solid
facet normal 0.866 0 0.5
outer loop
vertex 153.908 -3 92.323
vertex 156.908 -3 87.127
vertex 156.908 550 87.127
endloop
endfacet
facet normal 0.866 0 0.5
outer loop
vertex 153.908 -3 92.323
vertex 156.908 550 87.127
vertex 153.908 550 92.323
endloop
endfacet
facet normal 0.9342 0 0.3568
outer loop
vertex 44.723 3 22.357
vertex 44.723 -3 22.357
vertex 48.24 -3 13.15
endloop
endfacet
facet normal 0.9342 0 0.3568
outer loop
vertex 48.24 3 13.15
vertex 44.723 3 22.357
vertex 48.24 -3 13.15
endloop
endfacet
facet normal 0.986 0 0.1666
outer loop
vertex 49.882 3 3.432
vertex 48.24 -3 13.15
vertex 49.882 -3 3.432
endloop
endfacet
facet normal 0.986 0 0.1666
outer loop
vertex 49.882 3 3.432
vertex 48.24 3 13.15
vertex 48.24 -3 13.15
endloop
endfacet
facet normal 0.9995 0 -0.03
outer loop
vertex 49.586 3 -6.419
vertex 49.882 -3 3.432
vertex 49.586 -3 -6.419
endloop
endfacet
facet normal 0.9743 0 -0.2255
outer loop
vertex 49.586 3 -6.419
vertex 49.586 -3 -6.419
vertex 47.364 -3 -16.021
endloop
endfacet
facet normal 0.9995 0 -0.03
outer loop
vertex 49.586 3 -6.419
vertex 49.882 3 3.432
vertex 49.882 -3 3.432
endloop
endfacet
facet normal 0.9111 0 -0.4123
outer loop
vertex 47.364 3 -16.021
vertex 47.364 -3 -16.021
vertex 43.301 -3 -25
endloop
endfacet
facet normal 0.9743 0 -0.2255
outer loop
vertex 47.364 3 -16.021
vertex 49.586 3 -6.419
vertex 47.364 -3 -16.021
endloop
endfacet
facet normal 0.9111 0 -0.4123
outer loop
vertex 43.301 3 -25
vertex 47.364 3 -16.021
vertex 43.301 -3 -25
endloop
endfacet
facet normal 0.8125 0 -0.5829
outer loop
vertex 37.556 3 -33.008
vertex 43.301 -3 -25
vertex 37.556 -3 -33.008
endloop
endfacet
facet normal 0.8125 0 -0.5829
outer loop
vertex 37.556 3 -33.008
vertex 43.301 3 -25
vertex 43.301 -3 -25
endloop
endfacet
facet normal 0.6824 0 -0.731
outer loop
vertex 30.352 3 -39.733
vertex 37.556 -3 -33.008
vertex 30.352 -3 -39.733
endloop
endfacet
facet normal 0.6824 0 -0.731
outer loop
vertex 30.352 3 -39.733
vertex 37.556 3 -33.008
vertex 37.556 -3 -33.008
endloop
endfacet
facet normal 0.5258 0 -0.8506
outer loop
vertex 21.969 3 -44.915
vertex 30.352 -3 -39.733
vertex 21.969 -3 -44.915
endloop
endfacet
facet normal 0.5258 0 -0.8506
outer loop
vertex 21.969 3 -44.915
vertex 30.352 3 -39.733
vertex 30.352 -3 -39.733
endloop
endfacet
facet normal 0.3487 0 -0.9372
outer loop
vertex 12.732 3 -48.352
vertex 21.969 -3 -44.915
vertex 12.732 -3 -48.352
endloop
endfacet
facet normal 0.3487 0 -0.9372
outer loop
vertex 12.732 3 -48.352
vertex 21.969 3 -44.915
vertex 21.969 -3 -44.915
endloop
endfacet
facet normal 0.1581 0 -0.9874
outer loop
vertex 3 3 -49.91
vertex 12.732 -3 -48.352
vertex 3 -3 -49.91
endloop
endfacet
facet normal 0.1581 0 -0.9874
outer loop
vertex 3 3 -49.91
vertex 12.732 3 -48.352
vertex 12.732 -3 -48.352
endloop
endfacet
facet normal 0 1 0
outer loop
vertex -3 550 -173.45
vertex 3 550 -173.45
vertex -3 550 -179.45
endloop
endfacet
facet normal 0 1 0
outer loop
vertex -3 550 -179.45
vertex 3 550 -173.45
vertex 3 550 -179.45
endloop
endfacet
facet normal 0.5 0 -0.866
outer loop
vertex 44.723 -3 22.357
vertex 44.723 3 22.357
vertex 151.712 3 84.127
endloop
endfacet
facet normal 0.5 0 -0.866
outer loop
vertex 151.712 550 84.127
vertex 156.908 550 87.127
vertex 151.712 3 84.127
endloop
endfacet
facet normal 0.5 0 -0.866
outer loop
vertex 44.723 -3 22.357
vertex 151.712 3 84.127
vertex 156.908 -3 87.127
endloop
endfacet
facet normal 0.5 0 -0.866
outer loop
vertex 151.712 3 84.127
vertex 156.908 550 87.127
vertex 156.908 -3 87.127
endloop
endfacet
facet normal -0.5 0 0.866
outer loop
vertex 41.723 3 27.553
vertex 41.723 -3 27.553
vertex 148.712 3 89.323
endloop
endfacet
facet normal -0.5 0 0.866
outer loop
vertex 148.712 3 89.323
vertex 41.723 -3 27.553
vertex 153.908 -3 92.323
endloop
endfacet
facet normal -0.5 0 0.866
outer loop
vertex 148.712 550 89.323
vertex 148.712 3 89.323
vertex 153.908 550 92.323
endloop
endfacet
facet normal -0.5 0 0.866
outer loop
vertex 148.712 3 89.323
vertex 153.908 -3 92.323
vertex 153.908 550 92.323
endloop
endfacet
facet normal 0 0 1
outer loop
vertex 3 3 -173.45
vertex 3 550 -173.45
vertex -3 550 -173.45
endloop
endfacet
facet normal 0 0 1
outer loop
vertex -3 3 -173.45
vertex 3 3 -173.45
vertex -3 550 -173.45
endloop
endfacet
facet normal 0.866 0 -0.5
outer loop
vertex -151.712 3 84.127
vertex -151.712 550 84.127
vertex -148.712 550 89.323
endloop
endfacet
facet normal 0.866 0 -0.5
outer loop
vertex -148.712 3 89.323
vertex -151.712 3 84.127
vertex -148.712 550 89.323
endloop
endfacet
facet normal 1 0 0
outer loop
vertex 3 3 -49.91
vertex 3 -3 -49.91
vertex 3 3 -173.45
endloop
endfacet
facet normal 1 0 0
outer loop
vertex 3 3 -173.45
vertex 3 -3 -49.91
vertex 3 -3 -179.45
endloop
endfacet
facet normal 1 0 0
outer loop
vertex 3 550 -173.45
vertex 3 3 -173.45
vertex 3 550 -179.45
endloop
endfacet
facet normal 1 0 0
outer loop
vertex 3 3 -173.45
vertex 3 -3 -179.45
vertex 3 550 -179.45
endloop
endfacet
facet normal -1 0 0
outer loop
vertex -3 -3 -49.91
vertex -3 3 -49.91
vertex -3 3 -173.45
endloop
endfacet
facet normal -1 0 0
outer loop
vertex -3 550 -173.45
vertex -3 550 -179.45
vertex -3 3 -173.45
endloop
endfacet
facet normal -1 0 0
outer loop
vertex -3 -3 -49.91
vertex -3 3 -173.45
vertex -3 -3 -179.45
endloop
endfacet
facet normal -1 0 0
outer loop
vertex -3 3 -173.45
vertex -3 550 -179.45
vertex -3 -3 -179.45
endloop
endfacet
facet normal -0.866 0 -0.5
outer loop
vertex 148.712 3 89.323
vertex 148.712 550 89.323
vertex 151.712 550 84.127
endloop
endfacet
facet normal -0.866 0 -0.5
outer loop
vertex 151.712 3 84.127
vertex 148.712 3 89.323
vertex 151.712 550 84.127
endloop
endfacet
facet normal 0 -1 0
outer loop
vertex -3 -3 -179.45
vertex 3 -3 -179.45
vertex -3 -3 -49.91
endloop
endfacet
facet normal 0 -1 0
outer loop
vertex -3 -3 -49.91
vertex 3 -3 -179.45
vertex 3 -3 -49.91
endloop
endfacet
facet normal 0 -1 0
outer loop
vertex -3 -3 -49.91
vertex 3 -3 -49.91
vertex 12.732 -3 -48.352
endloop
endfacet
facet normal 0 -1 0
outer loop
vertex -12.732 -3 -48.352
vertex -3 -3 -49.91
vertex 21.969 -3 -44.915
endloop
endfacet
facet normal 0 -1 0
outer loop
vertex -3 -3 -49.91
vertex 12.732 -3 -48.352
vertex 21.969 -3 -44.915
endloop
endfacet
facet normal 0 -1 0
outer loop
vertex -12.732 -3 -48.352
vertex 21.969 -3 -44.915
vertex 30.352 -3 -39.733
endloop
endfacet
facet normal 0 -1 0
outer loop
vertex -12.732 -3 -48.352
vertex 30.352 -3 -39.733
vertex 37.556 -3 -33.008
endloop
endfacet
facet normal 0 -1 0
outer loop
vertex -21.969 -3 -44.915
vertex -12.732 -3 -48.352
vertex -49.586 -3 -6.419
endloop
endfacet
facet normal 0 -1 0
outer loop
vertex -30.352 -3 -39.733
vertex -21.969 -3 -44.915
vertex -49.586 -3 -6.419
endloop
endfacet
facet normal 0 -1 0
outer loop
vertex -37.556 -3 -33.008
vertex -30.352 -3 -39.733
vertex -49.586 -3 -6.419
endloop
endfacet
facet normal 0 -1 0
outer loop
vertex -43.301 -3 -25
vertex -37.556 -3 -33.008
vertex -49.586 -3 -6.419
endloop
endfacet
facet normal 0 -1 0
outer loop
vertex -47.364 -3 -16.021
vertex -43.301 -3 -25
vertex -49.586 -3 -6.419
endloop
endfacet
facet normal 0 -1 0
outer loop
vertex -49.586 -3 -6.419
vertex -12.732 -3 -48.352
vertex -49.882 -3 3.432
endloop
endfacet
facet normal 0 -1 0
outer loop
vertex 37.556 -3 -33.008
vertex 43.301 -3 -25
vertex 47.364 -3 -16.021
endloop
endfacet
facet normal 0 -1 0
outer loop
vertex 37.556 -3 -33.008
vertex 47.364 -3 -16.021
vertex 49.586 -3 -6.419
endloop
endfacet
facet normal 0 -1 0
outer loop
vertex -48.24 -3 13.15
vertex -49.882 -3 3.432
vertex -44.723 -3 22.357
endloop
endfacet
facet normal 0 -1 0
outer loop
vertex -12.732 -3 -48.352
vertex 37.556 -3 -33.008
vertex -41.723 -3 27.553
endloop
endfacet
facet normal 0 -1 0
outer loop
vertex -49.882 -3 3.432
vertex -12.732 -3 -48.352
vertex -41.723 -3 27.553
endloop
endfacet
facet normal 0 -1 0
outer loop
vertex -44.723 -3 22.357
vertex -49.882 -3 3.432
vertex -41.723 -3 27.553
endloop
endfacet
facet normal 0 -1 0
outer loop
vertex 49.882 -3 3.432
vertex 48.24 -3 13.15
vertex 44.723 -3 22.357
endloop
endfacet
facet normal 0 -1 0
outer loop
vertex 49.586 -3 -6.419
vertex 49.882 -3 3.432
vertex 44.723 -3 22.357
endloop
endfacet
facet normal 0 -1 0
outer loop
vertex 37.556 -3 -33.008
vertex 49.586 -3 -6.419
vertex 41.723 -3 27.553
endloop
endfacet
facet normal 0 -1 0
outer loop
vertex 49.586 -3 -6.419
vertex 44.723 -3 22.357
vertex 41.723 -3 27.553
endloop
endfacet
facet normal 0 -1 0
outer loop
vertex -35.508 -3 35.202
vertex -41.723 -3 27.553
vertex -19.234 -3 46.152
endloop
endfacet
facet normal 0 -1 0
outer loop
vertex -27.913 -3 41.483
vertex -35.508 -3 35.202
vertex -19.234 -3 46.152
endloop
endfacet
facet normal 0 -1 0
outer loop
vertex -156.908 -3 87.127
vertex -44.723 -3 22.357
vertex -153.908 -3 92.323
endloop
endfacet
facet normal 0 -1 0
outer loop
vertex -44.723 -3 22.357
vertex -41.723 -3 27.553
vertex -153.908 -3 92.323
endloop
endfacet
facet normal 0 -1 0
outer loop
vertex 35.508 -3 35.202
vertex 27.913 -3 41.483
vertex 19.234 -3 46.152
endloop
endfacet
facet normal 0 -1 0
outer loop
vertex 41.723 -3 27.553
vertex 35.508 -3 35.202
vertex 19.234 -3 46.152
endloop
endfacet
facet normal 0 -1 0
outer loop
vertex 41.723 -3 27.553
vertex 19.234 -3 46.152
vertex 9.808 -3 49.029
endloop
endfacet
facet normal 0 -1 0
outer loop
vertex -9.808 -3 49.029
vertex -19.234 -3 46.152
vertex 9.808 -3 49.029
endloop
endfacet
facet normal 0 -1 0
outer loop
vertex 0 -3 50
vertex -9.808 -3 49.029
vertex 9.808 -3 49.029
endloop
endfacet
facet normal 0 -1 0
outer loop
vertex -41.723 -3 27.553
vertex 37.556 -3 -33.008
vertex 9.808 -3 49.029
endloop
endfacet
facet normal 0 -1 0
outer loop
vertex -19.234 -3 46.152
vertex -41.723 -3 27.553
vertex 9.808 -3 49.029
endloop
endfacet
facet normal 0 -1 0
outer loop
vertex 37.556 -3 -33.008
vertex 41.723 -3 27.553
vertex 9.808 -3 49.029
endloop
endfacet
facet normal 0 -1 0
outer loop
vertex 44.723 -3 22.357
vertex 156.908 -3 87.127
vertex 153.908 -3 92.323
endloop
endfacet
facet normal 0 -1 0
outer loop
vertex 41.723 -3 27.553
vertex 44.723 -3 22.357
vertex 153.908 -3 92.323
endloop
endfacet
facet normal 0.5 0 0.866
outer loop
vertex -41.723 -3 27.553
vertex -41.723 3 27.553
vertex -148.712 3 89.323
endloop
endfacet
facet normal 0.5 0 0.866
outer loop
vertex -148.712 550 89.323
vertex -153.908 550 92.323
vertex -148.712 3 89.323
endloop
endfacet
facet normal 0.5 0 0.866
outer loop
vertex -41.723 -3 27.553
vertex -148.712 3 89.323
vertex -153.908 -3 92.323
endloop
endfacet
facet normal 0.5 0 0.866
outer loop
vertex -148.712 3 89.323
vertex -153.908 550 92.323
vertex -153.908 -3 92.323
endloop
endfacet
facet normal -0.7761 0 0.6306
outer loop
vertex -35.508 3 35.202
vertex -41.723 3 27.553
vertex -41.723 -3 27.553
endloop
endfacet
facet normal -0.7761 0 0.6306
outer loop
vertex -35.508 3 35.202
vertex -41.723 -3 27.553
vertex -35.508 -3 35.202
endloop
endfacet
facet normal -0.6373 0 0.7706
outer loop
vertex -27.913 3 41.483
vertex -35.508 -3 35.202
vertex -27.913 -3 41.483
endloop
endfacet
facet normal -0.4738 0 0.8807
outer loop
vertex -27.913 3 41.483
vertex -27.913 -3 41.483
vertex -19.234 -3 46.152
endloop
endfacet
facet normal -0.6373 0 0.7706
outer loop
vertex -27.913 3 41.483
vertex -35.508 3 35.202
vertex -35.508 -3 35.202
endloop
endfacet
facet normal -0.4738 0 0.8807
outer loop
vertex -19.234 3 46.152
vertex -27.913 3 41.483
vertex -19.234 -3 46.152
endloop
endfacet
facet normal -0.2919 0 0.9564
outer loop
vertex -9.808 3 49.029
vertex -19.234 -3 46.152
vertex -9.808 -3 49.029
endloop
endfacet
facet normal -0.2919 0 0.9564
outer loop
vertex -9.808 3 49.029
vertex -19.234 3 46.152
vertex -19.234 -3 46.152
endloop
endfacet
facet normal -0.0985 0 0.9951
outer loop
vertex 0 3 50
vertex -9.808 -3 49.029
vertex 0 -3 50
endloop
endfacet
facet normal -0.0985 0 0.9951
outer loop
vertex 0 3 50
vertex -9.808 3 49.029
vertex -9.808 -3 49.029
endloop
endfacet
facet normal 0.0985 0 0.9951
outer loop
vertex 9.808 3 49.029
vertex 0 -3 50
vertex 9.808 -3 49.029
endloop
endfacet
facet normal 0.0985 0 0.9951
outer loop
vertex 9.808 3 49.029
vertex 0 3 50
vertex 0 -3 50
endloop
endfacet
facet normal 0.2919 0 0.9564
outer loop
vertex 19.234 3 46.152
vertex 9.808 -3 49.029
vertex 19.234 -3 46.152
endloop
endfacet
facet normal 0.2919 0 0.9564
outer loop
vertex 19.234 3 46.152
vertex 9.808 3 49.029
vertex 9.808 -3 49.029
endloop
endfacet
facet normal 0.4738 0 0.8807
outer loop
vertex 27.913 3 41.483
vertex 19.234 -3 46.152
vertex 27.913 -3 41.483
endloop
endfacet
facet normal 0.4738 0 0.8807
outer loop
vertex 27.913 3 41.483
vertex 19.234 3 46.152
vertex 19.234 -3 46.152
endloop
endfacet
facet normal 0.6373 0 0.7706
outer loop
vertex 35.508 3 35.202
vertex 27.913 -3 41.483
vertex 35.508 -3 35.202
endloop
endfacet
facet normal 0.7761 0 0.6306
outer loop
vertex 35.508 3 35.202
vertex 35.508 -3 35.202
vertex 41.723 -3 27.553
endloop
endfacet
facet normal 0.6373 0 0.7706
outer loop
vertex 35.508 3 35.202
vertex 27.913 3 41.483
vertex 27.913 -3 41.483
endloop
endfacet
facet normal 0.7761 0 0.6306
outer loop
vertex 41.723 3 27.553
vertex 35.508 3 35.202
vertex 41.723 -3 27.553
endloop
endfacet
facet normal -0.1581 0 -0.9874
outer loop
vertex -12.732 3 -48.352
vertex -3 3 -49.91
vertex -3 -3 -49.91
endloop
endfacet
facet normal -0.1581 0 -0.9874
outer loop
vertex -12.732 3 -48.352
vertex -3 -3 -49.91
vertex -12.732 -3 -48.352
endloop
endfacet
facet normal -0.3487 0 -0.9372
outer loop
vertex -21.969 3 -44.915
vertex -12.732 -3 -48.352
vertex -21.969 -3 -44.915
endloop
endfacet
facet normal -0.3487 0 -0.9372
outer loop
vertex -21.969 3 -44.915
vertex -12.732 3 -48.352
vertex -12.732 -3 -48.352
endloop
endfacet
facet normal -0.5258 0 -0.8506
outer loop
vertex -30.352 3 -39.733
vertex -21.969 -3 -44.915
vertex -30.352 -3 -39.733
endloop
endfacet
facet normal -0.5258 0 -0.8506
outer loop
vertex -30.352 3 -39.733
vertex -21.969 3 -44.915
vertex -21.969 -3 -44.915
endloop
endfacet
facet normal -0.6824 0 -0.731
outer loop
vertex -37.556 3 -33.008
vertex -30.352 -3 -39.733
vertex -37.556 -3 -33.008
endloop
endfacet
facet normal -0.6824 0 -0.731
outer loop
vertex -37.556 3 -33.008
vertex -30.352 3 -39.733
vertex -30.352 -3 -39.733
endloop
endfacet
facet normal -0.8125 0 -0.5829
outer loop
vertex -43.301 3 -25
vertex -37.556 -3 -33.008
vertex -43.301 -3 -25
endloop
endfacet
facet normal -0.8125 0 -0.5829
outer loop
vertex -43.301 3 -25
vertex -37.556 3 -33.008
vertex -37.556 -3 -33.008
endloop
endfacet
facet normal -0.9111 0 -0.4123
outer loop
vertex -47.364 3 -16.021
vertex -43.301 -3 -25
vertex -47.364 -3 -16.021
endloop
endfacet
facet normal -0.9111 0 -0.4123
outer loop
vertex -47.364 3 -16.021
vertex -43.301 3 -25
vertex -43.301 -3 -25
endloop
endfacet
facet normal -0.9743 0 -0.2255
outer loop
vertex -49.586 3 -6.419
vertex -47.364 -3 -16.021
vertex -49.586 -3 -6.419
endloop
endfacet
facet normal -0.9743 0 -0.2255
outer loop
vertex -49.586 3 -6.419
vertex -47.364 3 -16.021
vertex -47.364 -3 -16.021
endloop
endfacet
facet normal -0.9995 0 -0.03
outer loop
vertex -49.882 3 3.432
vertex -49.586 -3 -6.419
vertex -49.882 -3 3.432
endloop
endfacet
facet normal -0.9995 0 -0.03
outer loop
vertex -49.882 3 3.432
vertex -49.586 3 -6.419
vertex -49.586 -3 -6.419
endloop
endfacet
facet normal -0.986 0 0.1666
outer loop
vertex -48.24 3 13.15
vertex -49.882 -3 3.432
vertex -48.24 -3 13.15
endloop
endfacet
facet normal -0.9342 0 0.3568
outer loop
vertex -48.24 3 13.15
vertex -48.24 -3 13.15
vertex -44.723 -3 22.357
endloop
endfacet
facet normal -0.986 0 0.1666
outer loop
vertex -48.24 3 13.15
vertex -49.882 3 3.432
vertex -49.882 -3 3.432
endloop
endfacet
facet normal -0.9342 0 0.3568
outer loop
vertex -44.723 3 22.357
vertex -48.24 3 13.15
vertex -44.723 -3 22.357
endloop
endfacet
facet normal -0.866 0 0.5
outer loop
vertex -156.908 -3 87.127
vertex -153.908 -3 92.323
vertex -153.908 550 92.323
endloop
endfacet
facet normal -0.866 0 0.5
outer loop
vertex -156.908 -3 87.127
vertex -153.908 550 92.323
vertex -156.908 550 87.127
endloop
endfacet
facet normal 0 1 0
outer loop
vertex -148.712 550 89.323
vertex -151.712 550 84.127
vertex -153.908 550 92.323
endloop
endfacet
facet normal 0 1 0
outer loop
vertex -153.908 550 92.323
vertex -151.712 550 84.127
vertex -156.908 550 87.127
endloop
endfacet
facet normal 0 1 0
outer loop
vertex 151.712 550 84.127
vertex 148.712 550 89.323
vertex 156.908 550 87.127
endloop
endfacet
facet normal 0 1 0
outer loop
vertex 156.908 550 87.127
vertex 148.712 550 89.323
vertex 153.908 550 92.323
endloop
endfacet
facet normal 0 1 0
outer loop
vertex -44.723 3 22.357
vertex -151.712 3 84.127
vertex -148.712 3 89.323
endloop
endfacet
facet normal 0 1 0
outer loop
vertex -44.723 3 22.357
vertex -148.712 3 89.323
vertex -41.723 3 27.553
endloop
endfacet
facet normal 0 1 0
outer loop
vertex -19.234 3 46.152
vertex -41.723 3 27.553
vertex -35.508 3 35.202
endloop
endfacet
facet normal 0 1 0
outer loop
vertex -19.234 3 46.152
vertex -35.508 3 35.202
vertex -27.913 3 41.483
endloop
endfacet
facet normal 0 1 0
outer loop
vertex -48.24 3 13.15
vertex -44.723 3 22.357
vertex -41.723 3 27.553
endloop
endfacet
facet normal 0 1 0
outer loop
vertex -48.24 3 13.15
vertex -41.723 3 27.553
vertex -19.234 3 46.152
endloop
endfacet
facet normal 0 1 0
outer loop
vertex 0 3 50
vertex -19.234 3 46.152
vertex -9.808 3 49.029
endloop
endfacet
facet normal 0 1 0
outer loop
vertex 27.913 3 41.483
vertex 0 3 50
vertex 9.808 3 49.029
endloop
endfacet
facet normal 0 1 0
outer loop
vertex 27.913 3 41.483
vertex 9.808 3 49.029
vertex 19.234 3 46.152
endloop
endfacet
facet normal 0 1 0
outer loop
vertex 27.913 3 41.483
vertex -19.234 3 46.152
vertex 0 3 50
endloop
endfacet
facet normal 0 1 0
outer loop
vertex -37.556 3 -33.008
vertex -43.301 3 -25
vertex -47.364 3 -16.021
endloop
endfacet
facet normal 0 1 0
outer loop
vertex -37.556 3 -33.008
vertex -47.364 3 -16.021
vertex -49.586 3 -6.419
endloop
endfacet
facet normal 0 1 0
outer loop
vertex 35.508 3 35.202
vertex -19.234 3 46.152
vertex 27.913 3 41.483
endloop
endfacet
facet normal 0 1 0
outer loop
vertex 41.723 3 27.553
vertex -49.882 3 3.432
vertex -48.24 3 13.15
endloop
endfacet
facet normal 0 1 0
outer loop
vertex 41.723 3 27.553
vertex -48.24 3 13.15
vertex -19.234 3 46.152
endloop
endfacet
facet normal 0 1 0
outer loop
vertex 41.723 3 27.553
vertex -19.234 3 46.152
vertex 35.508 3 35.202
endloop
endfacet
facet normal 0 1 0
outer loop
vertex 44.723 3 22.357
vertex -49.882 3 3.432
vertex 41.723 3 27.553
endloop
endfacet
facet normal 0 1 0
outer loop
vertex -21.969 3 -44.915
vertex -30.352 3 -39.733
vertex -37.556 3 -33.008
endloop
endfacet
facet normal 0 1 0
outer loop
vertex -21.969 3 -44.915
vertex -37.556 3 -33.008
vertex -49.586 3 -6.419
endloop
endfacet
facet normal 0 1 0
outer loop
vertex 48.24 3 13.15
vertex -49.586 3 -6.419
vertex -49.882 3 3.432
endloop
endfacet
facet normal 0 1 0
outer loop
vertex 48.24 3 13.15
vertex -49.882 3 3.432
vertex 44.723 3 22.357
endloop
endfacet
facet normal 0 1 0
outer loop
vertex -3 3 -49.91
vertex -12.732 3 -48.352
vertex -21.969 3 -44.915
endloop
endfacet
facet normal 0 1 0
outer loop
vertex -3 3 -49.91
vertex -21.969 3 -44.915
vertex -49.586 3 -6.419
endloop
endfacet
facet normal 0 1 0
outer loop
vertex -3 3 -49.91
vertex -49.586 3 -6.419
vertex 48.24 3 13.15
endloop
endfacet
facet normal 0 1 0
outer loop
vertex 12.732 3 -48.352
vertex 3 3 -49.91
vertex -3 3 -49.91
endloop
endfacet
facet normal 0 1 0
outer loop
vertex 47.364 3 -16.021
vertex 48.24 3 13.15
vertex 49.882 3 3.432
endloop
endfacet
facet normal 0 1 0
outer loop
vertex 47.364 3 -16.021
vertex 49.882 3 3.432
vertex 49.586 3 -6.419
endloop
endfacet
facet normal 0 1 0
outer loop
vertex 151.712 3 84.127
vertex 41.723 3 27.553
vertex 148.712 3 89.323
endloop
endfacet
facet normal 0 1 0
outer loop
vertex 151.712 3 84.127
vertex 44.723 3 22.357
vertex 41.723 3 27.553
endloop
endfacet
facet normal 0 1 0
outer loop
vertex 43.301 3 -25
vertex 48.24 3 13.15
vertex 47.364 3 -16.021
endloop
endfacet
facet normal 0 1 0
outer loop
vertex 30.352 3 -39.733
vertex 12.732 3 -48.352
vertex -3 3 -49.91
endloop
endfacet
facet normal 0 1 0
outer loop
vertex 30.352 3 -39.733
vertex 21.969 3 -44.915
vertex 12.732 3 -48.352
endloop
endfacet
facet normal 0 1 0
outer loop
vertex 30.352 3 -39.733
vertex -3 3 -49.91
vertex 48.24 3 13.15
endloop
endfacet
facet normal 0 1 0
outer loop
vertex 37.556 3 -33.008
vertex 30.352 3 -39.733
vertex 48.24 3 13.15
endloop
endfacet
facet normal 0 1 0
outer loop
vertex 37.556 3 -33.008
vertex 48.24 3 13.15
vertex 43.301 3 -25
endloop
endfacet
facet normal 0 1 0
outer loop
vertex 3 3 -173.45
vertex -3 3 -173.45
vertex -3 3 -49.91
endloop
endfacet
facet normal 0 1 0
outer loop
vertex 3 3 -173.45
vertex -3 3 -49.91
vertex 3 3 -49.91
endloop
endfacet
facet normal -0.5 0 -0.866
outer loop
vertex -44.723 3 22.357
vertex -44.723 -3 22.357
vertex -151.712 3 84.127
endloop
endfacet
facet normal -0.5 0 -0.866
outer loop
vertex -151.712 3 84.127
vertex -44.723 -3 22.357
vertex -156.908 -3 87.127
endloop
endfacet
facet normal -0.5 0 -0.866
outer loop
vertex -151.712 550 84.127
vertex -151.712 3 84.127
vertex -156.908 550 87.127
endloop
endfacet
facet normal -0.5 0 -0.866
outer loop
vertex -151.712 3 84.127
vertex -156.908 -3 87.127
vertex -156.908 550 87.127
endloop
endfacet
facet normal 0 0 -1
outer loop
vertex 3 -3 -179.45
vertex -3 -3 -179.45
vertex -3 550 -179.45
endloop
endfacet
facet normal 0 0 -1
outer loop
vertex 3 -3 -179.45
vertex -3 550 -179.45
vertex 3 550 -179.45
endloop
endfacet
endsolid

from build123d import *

# Parameters (mm, degrees)
ESQUISSE2_W                  = 6
ESQUISSE2_H                  = 6
ESQUISSE3_R                  = 50
BOSS_EXTRU_1_DEPTH           = 3
R_P_TITION_CIRCULAIRE1_COUNT = 3


with BuildPart() as part:
    # Balayage2: sweep along a curve in space
    with BuildLine() as balayage2_path:
        Line((0, 0, 0), (0, 0, -176.45))
        Line((0, 0, -176.45), (0, 550, -176.45))
    # Esquisse2 → Balayage2 (sweep)
    with BuildSketch(Plane.XY):
        Rectangle(ESQUISSE2_W, ESQUISSE2_H)
    balayage2 = sweep(path=balayage2_path.line, transition=Transition.RIGHT)

    # Esquisse3 → Boss.-Extru.1 (add, symmetric)
    with BuildSketch(Plane(origin=(0, 0, 0), x_dir=(1, 0, 0), z_dir=(0, 1, 0))):
        Circle(ESQUISSE3_R)
    extrude(amount=BOSS_EXTRU_1_DEPTH, both=True)

    # Répétition circulaire1: Balayage2 ×3 about axis
    r_p_tition_circulaire1_axis = Axis((0, 0, 0), (0, 1, 0))
    for i in range(1, R_P_TITION_CIRCULAIRE1_COUNT):
        add(balayage2.rotate(r_p_tition_circulaire1_axis, i * 360 / R_P_TITION_CIRCULAIRE1_COUNT))


solid = part.part
